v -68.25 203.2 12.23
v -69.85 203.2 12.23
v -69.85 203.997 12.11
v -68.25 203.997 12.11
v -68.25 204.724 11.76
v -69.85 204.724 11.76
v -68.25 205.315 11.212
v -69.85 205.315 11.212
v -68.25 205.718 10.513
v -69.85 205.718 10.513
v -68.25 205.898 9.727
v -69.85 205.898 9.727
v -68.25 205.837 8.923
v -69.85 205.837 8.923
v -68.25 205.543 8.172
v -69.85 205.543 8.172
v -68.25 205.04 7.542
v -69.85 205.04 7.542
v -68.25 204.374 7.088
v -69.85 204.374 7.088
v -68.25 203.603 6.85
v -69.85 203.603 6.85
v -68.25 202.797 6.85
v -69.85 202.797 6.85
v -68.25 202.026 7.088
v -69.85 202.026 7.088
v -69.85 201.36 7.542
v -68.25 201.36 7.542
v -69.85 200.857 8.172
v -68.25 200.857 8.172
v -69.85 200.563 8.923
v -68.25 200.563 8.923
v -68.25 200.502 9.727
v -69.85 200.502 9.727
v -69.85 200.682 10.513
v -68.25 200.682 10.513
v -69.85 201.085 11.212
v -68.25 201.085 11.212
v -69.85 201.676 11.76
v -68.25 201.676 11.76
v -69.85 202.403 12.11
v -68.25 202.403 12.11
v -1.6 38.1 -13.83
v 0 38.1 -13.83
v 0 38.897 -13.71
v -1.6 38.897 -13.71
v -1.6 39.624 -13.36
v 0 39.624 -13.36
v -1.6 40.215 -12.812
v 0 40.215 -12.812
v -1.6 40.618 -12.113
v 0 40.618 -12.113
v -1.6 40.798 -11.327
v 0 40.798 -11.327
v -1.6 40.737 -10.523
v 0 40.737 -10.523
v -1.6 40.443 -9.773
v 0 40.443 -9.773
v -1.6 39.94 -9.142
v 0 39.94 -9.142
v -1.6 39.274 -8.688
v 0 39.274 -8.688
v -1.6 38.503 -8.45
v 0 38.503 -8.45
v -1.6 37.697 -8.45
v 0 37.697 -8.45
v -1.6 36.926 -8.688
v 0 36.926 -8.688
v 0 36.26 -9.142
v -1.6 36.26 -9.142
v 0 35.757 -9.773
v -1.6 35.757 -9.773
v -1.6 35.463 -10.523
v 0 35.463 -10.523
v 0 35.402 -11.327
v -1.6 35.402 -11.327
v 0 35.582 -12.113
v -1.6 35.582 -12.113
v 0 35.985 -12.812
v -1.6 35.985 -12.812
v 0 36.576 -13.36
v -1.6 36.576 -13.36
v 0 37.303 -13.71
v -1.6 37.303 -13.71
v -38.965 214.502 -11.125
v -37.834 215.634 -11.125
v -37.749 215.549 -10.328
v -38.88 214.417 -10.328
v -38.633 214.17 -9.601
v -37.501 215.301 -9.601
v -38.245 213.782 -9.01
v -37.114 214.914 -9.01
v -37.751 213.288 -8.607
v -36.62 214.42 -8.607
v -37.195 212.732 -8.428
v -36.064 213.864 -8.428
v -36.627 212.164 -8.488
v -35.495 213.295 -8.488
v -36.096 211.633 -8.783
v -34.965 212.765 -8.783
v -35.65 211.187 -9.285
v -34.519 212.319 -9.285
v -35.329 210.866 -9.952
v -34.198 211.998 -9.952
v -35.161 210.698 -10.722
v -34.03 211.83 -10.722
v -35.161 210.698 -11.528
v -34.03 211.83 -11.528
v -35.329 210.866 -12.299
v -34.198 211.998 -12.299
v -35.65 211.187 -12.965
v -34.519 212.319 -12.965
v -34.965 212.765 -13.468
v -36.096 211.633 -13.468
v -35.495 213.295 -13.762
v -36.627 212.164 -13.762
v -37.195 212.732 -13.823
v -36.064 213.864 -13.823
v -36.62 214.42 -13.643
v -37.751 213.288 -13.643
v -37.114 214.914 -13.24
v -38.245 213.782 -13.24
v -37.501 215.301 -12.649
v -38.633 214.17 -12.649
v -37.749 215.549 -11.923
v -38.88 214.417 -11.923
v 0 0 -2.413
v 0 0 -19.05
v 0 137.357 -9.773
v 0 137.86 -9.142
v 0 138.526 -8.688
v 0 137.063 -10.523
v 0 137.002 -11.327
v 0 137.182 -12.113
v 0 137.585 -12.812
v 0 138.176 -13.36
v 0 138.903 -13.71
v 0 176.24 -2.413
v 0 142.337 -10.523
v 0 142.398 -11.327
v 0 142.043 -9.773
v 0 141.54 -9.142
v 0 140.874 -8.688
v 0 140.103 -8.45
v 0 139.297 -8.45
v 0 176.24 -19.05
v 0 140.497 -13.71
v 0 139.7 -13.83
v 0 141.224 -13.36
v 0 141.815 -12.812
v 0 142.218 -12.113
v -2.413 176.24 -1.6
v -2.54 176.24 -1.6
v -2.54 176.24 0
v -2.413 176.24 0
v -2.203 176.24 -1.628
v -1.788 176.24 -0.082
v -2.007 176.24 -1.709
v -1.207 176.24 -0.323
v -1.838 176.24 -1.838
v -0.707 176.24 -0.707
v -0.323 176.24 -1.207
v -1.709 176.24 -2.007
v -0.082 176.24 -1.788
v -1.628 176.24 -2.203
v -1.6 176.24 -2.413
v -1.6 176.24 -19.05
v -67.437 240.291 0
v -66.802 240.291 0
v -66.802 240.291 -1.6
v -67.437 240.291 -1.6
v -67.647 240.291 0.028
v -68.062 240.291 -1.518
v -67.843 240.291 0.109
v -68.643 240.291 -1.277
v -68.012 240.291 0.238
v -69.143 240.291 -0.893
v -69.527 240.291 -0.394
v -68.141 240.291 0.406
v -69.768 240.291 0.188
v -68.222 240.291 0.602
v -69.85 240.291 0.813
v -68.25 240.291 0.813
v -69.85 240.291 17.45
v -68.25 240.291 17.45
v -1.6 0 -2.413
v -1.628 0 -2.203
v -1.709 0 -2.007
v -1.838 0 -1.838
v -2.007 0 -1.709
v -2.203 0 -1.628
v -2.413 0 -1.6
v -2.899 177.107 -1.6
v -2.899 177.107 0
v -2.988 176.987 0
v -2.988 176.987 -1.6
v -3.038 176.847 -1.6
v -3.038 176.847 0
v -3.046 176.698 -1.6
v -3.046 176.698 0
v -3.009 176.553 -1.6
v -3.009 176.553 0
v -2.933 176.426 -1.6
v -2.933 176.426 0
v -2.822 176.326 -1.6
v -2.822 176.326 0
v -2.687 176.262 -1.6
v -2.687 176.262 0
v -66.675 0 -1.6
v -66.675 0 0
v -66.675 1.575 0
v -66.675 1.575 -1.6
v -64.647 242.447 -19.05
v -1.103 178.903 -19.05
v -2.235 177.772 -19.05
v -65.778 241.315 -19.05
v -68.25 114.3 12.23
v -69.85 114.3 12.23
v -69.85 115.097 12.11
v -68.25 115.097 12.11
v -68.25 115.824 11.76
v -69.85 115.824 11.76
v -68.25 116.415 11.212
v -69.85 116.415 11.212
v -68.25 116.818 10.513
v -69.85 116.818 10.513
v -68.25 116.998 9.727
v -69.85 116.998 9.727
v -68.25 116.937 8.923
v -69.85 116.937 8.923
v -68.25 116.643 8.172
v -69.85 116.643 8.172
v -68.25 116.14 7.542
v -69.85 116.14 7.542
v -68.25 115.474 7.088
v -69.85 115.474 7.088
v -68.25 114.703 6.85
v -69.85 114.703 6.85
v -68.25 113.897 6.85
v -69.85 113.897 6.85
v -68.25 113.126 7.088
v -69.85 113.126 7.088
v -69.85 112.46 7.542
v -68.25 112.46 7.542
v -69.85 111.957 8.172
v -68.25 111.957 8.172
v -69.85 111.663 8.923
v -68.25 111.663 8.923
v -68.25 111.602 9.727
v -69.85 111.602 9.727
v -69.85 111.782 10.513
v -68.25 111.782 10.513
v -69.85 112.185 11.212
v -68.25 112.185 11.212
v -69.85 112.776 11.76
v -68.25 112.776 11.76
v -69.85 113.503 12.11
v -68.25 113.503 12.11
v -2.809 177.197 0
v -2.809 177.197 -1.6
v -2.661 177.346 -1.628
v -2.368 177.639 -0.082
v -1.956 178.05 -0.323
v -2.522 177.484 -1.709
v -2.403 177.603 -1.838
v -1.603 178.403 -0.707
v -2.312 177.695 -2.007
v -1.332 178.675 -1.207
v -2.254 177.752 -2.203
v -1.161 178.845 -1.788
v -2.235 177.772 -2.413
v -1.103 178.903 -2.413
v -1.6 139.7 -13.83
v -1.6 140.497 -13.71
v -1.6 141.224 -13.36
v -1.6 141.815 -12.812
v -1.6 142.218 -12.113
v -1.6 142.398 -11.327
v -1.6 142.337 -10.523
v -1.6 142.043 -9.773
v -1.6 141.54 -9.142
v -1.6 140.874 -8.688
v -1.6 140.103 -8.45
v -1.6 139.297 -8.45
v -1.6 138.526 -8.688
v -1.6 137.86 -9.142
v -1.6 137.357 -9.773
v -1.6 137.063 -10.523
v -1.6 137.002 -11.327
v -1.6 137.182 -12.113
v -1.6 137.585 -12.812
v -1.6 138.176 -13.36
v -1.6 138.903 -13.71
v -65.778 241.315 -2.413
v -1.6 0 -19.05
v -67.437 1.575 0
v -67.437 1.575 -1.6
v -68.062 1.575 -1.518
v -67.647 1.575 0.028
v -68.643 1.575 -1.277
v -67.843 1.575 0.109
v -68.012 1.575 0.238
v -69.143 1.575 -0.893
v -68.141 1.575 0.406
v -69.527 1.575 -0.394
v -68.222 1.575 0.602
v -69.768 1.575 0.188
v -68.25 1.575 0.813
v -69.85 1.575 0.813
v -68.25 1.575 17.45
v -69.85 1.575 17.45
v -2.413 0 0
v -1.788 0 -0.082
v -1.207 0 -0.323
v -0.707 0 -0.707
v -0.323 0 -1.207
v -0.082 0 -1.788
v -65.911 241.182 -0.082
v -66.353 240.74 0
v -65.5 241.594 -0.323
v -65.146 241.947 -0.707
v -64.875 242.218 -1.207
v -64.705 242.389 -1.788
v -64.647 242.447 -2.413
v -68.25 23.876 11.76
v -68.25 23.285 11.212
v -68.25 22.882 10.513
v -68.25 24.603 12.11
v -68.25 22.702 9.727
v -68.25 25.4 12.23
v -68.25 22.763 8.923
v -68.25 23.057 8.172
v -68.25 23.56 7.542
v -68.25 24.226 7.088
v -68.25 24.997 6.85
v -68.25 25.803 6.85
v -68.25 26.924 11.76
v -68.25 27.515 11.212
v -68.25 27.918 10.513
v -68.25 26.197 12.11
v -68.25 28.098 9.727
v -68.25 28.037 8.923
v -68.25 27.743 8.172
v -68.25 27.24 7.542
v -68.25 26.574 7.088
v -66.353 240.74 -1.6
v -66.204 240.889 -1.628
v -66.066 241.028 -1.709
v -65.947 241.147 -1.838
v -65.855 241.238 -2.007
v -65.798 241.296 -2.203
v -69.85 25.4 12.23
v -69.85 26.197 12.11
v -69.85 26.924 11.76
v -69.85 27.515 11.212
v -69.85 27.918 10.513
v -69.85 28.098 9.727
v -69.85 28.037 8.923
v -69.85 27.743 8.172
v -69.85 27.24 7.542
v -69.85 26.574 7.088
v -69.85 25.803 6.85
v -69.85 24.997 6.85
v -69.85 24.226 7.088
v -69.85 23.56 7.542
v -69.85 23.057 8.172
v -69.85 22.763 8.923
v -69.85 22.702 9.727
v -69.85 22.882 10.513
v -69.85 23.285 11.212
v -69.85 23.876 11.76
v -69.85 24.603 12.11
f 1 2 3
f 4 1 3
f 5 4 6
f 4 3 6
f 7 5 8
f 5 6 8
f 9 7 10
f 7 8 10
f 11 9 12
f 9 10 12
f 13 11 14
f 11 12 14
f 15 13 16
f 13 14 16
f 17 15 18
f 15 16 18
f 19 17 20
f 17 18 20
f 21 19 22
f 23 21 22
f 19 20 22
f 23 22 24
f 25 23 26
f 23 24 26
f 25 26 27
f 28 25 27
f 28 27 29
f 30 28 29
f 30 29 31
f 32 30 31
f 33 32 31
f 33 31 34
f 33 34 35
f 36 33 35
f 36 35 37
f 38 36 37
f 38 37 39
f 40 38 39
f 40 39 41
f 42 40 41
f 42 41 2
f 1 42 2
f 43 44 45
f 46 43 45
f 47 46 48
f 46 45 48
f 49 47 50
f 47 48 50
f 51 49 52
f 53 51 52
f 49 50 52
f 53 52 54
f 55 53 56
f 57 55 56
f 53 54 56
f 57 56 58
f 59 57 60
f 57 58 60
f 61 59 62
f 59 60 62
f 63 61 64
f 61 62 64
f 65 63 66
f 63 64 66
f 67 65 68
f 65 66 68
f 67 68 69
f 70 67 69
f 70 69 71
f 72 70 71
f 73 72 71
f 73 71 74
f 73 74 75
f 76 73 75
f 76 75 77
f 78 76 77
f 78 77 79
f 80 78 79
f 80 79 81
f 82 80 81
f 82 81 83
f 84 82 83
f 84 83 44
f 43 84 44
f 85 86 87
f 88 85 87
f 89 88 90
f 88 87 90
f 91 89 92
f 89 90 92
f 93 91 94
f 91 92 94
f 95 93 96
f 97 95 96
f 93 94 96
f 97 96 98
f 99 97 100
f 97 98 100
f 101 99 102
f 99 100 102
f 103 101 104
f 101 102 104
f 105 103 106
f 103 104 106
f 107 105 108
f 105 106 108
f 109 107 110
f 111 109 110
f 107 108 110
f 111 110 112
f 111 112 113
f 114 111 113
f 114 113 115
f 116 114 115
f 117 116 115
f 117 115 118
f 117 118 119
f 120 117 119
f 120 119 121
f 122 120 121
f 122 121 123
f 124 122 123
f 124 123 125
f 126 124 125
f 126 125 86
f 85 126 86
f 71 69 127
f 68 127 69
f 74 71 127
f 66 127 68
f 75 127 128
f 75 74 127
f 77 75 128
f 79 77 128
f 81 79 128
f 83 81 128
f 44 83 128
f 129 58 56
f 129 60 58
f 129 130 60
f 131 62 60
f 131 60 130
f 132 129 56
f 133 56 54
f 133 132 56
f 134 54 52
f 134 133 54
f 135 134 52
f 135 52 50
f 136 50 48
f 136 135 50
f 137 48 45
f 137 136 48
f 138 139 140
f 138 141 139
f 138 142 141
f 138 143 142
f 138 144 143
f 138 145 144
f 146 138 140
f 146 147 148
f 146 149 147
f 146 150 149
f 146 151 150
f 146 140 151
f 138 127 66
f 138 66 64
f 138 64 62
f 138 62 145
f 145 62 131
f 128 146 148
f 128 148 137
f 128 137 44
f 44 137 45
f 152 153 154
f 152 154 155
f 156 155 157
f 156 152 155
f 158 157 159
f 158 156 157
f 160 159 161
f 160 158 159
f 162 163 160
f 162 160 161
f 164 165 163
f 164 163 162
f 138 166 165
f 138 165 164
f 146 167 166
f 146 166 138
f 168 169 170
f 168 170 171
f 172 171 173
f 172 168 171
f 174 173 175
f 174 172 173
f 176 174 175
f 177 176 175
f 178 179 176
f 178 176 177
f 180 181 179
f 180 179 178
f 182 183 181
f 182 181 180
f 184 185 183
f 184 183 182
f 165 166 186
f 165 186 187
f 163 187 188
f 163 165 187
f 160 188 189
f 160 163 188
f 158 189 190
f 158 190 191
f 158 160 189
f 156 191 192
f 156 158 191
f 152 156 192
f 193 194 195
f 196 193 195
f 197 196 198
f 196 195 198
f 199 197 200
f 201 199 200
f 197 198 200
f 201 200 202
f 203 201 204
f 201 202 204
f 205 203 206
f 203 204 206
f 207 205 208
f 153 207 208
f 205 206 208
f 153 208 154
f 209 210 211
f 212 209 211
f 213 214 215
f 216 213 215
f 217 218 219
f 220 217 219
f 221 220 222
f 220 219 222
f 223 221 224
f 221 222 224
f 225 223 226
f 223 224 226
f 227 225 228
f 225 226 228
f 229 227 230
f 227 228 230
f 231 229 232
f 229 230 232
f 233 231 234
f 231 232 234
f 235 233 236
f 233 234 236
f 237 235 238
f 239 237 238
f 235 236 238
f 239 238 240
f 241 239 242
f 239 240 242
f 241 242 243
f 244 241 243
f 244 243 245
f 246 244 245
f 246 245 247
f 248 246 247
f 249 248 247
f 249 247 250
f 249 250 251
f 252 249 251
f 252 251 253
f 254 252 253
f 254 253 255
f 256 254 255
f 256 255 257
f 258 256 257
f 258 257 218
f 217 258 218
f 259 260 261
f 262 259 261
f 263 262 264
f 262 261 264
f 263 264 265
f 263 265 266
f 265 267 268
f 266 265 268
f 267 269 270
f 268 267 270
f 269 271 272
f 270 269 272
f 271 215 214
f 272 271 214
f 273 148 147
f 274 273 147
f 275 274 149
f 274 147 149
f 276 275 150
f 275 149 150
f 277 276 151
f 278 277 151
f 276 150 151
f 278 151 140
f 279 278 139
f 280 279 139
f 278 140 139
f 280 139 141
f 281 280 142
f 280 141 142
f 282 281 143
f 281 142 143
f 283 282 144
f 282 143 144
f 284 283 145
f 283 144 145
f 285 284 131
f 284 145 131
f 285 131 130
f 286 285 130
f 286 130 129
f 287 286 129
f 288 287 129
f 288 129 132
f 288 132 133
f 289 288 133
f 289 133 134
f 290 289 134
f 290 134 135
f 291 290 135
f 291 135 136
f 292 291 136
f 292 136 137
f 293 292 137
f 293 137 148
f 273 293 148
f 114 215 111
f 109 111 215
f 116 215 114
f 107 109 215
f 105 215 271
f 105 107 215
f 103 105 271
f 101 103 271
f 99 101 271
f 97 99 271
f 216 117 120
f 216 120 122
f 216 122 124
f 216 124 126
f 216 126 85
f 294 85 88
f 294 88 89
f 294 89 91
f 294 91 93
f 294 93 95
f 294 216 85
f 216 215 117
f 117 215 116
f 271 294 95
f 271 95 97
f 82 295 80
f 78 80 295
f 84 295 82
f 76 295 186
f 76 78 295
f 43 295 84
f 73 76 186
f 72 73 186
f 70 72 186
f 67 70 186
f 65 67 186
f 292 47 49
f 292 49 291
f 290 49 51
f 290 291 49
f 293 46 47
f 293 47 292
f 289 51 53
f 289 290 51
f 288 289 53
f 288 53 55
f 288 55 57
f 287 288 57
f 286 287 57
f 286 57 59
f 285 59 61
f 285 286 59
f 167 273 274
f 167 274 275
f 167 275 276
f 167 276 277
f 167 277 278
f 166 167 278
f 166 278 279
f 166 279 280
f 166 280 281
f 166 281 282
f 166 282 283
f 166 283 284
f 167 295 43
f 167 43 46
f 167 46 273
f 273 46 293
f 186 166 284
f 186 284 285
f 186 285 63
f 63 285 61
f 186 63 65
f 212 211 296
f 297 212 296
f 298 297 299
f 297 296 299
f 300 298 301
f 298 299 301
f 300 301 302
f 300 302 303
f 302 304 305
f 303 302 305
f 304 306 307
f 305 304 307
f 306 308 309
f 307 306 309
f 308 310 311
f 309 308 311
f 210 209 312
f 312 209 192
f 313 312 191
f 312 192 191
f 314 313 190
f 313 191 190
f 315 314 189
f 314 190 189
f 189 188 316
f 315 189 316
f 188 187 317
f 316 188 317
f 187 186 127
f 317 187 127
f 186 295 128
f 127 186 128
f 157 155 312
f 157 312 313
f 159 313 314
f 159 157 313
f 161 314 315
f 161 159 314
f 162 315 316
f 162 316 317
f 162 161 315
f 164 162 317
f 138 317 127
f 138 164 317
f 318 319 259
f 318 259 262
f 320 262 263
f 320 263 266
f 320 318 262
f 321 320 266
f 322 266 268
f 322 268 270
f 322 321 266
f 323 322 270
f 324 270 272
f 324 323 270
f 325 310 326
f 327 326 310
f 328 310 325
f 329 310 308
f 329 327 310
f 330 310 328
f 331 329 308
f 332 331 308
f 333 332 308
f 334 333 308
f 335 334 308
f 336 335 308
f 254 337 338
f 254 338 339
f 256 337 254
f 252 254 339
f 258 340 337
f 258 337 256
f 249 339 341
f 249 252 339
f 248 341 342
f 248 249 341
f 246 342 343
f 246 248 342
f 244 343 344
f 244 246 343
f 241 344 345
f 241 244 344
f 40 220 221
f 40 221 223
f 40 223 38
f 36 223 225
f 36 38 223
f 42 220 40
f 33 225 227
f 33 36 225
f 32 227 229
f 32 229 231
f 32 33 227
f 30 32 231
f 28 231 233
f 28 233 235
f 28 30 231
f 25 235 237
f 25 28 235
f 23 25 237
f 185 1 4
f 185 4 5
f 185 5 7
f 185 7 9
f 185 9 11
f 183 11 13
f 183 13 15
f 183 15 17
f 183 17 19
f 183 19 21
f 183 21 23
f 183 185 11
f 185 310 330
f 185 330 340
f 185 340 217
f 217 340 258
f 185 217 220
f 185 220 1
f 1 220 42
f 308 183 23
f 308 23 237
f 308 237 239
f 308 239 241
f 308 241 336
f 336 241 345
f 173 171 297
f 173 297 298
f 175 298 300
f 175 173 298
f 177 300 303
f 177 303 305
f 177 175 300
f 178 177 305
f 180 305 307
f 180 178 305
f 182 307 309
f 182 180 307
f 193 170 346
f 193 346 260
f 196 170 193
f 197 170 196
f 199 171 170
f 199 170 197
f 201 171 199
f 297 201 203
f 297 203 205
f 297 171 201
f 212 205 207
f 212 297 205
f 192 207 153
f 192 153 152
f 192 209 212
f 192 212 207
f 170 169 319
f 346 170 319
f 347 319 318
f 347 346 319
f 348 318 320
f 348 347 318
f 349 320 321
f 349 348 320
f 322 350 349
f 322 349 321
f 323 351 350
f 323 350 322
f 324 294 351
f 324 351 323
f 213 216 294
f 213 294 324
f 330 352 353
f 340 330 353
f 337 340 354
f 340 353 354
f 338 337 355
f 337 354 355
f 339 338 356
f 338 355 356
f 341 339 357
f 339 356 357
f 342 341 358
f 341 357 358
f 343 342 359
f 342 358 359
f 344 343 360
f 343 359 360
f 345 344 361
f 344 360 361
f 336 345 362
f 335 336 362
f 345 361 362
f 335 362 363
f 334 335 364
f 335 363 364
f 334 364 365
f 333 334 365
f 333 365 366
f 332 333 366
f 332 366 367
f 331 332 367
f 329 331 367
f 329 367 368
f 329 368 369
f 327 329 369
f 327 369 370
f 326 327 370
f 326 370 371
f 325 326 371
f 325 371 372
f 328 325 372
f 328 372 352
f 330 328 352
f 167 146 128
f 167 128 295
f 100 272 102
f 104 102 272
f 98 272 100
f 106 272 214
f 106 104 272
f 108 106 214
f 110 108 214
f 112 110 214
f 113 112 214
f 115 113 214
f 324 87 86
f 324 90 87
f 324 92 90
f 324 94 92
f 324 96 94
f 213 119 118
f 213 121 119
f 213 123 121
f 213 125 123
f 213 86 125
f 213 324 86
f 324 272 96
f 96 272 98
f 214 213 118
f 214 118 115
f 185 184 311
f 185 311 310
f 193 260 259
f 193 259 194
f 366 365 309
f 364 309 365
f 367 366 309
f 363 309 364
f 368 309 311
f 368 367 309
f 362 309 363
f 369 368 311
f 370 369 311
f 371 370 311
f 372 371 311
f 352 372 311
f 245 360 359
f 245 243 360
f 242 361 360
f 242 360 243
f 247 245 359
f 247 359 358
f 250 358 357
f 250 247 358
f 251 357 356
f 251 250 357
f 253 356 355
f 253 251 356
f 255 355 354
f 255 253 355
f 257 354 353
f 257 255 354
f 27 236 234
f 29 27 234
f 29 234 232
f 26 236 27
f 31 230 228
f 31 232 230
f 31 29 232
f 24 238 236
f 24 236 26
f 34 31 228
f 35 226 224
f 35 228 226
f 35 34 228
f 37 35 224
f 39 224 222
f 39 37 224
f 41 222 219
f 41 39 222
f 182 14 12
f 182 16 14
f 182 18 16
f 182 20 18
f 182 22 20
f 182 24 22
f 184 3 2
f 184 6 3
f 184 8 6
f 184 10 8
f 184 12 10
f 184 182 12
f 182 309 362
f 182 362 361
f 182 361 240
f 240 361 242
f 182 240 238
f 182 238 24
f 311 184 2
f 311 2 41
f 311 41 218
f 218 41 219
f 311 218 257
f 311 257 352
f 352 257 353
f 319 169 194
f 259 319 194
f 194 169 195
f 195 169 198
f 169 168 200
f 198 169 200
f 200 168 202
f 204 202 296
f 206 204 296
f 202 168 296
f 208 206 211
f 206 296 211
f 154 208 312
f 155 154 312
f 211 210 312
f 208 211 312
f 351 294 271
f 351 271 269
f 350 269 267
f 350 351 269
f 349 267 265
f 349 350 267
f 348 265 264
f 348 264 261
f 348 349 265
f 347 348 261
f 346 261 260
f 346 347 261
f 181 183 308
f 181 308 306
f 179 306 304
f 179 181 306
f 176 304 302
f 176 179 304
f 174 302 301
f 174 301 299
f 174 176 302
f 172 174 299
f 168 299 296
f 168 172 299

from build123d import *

# Parameters (mm, degrees)
BASE_FLANGE1_DEPTH           = 1.6002
EDGE_FLANGE1_STRIP_W         = 8.0264
EDGE_FLANGE1_STRIP_H         = 1.6002
EDGE_FLANGE1_STRIP_CUT_DEPTH = 176.239897552
EDGE_FLANGE1_DEPTH           = 176.239897552
EDGE_FLANGE2_STRIP_W         = 8.0264
EDGE_FLANGE2_STRIP_H         = 1.6002
EDGE_FLANGE2_STRIP_CUT_DEPTH = 89.864191945
EDGE_FLANGE2_DEPTH           = 89.864191945
EDGE_FLANGE3_STRIP_W         = 8.0264
EDGE_FLANGE3_STRIP_H         = 1.6002
EDGE_FLANGE3_STRIP_CUT_DEPTH = 238.716677062
EDGE_FLANGE3_DEPTH           = 238.716677062
SKETCH18_R                   = 2.7051
CUT_EXTRUDE3_DEPTH           = 7.62
SKETCH19_R                   = 2.7051
CUT_EXTRUDE4_DEPTH           = 7.62
SKETCH20_R                   = 2.7051
CUT_EXTRUDE5_DEPTH           = 7.62


# Read off the part's stored shape, not the designer's step: Base-Flange1
# Sheet-metal steps are written as plain solids
with BuildPart() as part:
    # Base-Flange1 outline → Base-Flange1 (new body)
    with BuildSketch(Plane(origin=(0, 0, 0), x_dir=(1, 0, 0), z_dir=(0, 0, -1))):
        with BuildLine():
            Line((0, 0), (-66.675, 0))
            Line((-66.675, 0), (-66.675, -1.5748))
            Line((-66.675, -1.5748), (-69.85, -1.5748))
            Line((-69.85, -1.5748), (-69.85, -240.291477062))
            Line((-69.85, -240.291477062), (-66.802, -240.291477062))
            Line((-66.802, -240.291477062), (-64.646738531, -242.446738531))
            Line((-64.646738531, -242.446738531), (-1.103159021, -178.903159021))
            Line((-1.103159021, -178.903159021), (-2.899210245, -177.107107796))
            ThreePointArc((-2.899210245, -177.107107796), (-3.009330803, -176.553494368), (-2.54, -176.239897552))
            Line((-2.54, -176.239897552), (0, -176.239897552))
            Line((0, -176.239897552), (0, 0))
        make_face()
    extrude(amount=BASE_FLANGE1_DEPTH)

    # Edge-Flange1 strip (across the edge) → Edge-Flange1 strip cut (cut)
    with BuildSketch(Plane(origin=(0, 176.239897552, -1.6002), x_dir=(-1, 0, 0), z_dir=(0, -1, 0))):
        with Locations((-1.6002, -0.8001)):
            Rectangle(EDGE_FLANGE1_STRIP_W, EDGE_FLANGE1_STRIP_H)
    extrude(amount=EDGE_FLANGE1_STRIP_CUT_DEPTH, mode=Mode.SUBTRACT)

    # Edge-Flange1 section (across the edge) → Edge-Flange1 (add)
    with BuildSketch(Plane(origin=(0, 176.239897552, -1.6002), x_dir=(-1, 0, 0), z_dir=(0, -1, 0))):
        with BuildLine():
            Line((0, 0.8128), (0, 17.4498))
            Line((0, 17.4498), (1.6002, 17.4498))
            Line((1.6002, 17.4498), (1.6002, 0.8128))
            ThreePointArc((1.6002, 0.8128), (1.838263608, 0.238063608), (2.413, 0))
            Line((2.413, 0), (2.413, -1.6002))
            ThreePointArc((2.413, -1.6002), (0.706751337, -0.893448663), (0, 0.8128))
        make_face()
    extrude(amount=EDGE_FLANGE1_DEPTH)

    # Edge-Flange2 strip (across the edge) → Edge-Flange2 strip cut (cut)
    with BuildSketch(Plane(origin=(-64.646738531, 242.446738531, -1.6002), x_dir=(-0.7071067811865479, -0.7071067811865472, -3.58046925441613e-15), z_dir=(0.7071067811865472, -0.7071067811865479, 0))):
        with Locations((-1.6002, -0.8001)):
            Rectangle(EDGE_FLANGE2_STRIP_W, EDGE_FLANGE2_STRIP_H)
    extrude(amount=EDGE_FLANGE2_STRIP_CUT_DEPTH, mode=Mode.SUBTRACT)

    # Edge-Flange2 section (across the edge) → Edge-Flange2 (add)
    with BuildSketch(Plane(origin=(-64.646738531, 242.446738531, -1.6002), x_dir=(-0.7071067811865479, -0.7071067811865472, -3.58046925441613e-15), z_dir=(0.7071067811865472, -0.7071067811865479, 0))):
        with BuildLine():
            Line((0, 0.8128), (0, 17.4498))
            Line((0, 17.4498), (1.6002, 17.4498))
            Line((1.6002, 17.4498), (1.6002, 0.8128))
            ThreePointArc((1.6002, 0.8128), (1.838263608, 0.238063608), (2.413, 0))
            Line((2.413, 0), (2.413, -1.6002))
            ThreePointArc((2.413, -1.6002), (0.706751337, -0.893448663), (0, 0.8128))
        make_face()
    extrude(amount=EDGE_FLANGE2_DEPTH)

    # Edge-Flange3 strip (across the edge) → Edge-Flange3 strip cut (cut)
    with BuildSketch(Plane(origin=(-69.85, 240.291477062, 0), x_dir=(1, 0, 0), z_dir=(0, -1, 0))):
        with Locations((-1.6002, -0.8001)):
            Rectangle(EDGE_FLANGE3_STRIP_W, EDGE_FLANGE3_STRIP_H)
    extrude(amount=EDGE_FLANGE3_STRIP_CUT_DEPTH, mode=Mode.SUBTRACT)

    # Edge-Flange3 section (across the edge) → Edge-Flange3 (add)
    with BuildSketch(Plane(origin=(-69.85, 240.291477062, 0), x_dir=(1, 0, 0), z_dir=(0, -1, 0))):
        with BuildLine():
            Line((0, 0.8128), (0, 17.4498))
            Line((0, 17.4498), (1.6002, 17.4498))
            Line((1.6002, 17.4498), (1.6002, 0.8128))
            ThreePointArc((1.6002, 0.8128), (1.838263608, 0.238063608), (2.413, 0))
            Line((2.413, 0), (2.413, -1.6002))
            ThreePointArc((2.413, -1.6002), (0.706751337, -0.893448663), (0, 0.8128))
        make_face()
    extrude(amount=EDGE_FLANGE3_DEPTH)

    # Sketch18 → Cut-Extrude3 (cut)
    with BuildSketch(Plane(origin=(0, 0, 0), x_dir=(0, 0, -1), z_dir=(1, 0, 0))):
        with Locations((11.1252, 38.1)):
            Circle(SKETCH18_R)
        with Locations((11.1252, 139.7)):
            Circle(SKETCH18_R)
    extrude(amount=-CUT_EXTRUDE3_DEPTH, mode=Mode.SUBTRACT)

    # Sketch19 → Cut-Extrude4 (cut)
    with BuildSketch(Plane(origin=(88.9, 88.9, 0), x_dir=(0, 0, -1), z_dir=(0.7071067811865517, 0.7071067811865434, 3.37416286723297e-15))):
        with Locations(Location((11.1252, 176.523585695, 0), (0, 0, 90))):
            Circle(SKETCH19_R)
    extrude(amount=-CUT_EXTRUDE4_DEPTH, mode=Mode.SUBTRACT)

    # Sketch20 → Cut-Extrude5 (cut)
    with BuildSketch(Plane.ZY.offset(69.85)):
        with Locations((9.525, 25.4)):
            Circle(SKETCH20_R)
        with Locations((9.525, 114.3)):
            Circle(SKETCH20_R)
        with Locations((9.525, 203.2)):
            Circle(SKETCH20_R)
    extrude(amount=-CUT_EXTRUDE5_DEPTH, mode=Mode.SUBTRACT)


solid = part.part
